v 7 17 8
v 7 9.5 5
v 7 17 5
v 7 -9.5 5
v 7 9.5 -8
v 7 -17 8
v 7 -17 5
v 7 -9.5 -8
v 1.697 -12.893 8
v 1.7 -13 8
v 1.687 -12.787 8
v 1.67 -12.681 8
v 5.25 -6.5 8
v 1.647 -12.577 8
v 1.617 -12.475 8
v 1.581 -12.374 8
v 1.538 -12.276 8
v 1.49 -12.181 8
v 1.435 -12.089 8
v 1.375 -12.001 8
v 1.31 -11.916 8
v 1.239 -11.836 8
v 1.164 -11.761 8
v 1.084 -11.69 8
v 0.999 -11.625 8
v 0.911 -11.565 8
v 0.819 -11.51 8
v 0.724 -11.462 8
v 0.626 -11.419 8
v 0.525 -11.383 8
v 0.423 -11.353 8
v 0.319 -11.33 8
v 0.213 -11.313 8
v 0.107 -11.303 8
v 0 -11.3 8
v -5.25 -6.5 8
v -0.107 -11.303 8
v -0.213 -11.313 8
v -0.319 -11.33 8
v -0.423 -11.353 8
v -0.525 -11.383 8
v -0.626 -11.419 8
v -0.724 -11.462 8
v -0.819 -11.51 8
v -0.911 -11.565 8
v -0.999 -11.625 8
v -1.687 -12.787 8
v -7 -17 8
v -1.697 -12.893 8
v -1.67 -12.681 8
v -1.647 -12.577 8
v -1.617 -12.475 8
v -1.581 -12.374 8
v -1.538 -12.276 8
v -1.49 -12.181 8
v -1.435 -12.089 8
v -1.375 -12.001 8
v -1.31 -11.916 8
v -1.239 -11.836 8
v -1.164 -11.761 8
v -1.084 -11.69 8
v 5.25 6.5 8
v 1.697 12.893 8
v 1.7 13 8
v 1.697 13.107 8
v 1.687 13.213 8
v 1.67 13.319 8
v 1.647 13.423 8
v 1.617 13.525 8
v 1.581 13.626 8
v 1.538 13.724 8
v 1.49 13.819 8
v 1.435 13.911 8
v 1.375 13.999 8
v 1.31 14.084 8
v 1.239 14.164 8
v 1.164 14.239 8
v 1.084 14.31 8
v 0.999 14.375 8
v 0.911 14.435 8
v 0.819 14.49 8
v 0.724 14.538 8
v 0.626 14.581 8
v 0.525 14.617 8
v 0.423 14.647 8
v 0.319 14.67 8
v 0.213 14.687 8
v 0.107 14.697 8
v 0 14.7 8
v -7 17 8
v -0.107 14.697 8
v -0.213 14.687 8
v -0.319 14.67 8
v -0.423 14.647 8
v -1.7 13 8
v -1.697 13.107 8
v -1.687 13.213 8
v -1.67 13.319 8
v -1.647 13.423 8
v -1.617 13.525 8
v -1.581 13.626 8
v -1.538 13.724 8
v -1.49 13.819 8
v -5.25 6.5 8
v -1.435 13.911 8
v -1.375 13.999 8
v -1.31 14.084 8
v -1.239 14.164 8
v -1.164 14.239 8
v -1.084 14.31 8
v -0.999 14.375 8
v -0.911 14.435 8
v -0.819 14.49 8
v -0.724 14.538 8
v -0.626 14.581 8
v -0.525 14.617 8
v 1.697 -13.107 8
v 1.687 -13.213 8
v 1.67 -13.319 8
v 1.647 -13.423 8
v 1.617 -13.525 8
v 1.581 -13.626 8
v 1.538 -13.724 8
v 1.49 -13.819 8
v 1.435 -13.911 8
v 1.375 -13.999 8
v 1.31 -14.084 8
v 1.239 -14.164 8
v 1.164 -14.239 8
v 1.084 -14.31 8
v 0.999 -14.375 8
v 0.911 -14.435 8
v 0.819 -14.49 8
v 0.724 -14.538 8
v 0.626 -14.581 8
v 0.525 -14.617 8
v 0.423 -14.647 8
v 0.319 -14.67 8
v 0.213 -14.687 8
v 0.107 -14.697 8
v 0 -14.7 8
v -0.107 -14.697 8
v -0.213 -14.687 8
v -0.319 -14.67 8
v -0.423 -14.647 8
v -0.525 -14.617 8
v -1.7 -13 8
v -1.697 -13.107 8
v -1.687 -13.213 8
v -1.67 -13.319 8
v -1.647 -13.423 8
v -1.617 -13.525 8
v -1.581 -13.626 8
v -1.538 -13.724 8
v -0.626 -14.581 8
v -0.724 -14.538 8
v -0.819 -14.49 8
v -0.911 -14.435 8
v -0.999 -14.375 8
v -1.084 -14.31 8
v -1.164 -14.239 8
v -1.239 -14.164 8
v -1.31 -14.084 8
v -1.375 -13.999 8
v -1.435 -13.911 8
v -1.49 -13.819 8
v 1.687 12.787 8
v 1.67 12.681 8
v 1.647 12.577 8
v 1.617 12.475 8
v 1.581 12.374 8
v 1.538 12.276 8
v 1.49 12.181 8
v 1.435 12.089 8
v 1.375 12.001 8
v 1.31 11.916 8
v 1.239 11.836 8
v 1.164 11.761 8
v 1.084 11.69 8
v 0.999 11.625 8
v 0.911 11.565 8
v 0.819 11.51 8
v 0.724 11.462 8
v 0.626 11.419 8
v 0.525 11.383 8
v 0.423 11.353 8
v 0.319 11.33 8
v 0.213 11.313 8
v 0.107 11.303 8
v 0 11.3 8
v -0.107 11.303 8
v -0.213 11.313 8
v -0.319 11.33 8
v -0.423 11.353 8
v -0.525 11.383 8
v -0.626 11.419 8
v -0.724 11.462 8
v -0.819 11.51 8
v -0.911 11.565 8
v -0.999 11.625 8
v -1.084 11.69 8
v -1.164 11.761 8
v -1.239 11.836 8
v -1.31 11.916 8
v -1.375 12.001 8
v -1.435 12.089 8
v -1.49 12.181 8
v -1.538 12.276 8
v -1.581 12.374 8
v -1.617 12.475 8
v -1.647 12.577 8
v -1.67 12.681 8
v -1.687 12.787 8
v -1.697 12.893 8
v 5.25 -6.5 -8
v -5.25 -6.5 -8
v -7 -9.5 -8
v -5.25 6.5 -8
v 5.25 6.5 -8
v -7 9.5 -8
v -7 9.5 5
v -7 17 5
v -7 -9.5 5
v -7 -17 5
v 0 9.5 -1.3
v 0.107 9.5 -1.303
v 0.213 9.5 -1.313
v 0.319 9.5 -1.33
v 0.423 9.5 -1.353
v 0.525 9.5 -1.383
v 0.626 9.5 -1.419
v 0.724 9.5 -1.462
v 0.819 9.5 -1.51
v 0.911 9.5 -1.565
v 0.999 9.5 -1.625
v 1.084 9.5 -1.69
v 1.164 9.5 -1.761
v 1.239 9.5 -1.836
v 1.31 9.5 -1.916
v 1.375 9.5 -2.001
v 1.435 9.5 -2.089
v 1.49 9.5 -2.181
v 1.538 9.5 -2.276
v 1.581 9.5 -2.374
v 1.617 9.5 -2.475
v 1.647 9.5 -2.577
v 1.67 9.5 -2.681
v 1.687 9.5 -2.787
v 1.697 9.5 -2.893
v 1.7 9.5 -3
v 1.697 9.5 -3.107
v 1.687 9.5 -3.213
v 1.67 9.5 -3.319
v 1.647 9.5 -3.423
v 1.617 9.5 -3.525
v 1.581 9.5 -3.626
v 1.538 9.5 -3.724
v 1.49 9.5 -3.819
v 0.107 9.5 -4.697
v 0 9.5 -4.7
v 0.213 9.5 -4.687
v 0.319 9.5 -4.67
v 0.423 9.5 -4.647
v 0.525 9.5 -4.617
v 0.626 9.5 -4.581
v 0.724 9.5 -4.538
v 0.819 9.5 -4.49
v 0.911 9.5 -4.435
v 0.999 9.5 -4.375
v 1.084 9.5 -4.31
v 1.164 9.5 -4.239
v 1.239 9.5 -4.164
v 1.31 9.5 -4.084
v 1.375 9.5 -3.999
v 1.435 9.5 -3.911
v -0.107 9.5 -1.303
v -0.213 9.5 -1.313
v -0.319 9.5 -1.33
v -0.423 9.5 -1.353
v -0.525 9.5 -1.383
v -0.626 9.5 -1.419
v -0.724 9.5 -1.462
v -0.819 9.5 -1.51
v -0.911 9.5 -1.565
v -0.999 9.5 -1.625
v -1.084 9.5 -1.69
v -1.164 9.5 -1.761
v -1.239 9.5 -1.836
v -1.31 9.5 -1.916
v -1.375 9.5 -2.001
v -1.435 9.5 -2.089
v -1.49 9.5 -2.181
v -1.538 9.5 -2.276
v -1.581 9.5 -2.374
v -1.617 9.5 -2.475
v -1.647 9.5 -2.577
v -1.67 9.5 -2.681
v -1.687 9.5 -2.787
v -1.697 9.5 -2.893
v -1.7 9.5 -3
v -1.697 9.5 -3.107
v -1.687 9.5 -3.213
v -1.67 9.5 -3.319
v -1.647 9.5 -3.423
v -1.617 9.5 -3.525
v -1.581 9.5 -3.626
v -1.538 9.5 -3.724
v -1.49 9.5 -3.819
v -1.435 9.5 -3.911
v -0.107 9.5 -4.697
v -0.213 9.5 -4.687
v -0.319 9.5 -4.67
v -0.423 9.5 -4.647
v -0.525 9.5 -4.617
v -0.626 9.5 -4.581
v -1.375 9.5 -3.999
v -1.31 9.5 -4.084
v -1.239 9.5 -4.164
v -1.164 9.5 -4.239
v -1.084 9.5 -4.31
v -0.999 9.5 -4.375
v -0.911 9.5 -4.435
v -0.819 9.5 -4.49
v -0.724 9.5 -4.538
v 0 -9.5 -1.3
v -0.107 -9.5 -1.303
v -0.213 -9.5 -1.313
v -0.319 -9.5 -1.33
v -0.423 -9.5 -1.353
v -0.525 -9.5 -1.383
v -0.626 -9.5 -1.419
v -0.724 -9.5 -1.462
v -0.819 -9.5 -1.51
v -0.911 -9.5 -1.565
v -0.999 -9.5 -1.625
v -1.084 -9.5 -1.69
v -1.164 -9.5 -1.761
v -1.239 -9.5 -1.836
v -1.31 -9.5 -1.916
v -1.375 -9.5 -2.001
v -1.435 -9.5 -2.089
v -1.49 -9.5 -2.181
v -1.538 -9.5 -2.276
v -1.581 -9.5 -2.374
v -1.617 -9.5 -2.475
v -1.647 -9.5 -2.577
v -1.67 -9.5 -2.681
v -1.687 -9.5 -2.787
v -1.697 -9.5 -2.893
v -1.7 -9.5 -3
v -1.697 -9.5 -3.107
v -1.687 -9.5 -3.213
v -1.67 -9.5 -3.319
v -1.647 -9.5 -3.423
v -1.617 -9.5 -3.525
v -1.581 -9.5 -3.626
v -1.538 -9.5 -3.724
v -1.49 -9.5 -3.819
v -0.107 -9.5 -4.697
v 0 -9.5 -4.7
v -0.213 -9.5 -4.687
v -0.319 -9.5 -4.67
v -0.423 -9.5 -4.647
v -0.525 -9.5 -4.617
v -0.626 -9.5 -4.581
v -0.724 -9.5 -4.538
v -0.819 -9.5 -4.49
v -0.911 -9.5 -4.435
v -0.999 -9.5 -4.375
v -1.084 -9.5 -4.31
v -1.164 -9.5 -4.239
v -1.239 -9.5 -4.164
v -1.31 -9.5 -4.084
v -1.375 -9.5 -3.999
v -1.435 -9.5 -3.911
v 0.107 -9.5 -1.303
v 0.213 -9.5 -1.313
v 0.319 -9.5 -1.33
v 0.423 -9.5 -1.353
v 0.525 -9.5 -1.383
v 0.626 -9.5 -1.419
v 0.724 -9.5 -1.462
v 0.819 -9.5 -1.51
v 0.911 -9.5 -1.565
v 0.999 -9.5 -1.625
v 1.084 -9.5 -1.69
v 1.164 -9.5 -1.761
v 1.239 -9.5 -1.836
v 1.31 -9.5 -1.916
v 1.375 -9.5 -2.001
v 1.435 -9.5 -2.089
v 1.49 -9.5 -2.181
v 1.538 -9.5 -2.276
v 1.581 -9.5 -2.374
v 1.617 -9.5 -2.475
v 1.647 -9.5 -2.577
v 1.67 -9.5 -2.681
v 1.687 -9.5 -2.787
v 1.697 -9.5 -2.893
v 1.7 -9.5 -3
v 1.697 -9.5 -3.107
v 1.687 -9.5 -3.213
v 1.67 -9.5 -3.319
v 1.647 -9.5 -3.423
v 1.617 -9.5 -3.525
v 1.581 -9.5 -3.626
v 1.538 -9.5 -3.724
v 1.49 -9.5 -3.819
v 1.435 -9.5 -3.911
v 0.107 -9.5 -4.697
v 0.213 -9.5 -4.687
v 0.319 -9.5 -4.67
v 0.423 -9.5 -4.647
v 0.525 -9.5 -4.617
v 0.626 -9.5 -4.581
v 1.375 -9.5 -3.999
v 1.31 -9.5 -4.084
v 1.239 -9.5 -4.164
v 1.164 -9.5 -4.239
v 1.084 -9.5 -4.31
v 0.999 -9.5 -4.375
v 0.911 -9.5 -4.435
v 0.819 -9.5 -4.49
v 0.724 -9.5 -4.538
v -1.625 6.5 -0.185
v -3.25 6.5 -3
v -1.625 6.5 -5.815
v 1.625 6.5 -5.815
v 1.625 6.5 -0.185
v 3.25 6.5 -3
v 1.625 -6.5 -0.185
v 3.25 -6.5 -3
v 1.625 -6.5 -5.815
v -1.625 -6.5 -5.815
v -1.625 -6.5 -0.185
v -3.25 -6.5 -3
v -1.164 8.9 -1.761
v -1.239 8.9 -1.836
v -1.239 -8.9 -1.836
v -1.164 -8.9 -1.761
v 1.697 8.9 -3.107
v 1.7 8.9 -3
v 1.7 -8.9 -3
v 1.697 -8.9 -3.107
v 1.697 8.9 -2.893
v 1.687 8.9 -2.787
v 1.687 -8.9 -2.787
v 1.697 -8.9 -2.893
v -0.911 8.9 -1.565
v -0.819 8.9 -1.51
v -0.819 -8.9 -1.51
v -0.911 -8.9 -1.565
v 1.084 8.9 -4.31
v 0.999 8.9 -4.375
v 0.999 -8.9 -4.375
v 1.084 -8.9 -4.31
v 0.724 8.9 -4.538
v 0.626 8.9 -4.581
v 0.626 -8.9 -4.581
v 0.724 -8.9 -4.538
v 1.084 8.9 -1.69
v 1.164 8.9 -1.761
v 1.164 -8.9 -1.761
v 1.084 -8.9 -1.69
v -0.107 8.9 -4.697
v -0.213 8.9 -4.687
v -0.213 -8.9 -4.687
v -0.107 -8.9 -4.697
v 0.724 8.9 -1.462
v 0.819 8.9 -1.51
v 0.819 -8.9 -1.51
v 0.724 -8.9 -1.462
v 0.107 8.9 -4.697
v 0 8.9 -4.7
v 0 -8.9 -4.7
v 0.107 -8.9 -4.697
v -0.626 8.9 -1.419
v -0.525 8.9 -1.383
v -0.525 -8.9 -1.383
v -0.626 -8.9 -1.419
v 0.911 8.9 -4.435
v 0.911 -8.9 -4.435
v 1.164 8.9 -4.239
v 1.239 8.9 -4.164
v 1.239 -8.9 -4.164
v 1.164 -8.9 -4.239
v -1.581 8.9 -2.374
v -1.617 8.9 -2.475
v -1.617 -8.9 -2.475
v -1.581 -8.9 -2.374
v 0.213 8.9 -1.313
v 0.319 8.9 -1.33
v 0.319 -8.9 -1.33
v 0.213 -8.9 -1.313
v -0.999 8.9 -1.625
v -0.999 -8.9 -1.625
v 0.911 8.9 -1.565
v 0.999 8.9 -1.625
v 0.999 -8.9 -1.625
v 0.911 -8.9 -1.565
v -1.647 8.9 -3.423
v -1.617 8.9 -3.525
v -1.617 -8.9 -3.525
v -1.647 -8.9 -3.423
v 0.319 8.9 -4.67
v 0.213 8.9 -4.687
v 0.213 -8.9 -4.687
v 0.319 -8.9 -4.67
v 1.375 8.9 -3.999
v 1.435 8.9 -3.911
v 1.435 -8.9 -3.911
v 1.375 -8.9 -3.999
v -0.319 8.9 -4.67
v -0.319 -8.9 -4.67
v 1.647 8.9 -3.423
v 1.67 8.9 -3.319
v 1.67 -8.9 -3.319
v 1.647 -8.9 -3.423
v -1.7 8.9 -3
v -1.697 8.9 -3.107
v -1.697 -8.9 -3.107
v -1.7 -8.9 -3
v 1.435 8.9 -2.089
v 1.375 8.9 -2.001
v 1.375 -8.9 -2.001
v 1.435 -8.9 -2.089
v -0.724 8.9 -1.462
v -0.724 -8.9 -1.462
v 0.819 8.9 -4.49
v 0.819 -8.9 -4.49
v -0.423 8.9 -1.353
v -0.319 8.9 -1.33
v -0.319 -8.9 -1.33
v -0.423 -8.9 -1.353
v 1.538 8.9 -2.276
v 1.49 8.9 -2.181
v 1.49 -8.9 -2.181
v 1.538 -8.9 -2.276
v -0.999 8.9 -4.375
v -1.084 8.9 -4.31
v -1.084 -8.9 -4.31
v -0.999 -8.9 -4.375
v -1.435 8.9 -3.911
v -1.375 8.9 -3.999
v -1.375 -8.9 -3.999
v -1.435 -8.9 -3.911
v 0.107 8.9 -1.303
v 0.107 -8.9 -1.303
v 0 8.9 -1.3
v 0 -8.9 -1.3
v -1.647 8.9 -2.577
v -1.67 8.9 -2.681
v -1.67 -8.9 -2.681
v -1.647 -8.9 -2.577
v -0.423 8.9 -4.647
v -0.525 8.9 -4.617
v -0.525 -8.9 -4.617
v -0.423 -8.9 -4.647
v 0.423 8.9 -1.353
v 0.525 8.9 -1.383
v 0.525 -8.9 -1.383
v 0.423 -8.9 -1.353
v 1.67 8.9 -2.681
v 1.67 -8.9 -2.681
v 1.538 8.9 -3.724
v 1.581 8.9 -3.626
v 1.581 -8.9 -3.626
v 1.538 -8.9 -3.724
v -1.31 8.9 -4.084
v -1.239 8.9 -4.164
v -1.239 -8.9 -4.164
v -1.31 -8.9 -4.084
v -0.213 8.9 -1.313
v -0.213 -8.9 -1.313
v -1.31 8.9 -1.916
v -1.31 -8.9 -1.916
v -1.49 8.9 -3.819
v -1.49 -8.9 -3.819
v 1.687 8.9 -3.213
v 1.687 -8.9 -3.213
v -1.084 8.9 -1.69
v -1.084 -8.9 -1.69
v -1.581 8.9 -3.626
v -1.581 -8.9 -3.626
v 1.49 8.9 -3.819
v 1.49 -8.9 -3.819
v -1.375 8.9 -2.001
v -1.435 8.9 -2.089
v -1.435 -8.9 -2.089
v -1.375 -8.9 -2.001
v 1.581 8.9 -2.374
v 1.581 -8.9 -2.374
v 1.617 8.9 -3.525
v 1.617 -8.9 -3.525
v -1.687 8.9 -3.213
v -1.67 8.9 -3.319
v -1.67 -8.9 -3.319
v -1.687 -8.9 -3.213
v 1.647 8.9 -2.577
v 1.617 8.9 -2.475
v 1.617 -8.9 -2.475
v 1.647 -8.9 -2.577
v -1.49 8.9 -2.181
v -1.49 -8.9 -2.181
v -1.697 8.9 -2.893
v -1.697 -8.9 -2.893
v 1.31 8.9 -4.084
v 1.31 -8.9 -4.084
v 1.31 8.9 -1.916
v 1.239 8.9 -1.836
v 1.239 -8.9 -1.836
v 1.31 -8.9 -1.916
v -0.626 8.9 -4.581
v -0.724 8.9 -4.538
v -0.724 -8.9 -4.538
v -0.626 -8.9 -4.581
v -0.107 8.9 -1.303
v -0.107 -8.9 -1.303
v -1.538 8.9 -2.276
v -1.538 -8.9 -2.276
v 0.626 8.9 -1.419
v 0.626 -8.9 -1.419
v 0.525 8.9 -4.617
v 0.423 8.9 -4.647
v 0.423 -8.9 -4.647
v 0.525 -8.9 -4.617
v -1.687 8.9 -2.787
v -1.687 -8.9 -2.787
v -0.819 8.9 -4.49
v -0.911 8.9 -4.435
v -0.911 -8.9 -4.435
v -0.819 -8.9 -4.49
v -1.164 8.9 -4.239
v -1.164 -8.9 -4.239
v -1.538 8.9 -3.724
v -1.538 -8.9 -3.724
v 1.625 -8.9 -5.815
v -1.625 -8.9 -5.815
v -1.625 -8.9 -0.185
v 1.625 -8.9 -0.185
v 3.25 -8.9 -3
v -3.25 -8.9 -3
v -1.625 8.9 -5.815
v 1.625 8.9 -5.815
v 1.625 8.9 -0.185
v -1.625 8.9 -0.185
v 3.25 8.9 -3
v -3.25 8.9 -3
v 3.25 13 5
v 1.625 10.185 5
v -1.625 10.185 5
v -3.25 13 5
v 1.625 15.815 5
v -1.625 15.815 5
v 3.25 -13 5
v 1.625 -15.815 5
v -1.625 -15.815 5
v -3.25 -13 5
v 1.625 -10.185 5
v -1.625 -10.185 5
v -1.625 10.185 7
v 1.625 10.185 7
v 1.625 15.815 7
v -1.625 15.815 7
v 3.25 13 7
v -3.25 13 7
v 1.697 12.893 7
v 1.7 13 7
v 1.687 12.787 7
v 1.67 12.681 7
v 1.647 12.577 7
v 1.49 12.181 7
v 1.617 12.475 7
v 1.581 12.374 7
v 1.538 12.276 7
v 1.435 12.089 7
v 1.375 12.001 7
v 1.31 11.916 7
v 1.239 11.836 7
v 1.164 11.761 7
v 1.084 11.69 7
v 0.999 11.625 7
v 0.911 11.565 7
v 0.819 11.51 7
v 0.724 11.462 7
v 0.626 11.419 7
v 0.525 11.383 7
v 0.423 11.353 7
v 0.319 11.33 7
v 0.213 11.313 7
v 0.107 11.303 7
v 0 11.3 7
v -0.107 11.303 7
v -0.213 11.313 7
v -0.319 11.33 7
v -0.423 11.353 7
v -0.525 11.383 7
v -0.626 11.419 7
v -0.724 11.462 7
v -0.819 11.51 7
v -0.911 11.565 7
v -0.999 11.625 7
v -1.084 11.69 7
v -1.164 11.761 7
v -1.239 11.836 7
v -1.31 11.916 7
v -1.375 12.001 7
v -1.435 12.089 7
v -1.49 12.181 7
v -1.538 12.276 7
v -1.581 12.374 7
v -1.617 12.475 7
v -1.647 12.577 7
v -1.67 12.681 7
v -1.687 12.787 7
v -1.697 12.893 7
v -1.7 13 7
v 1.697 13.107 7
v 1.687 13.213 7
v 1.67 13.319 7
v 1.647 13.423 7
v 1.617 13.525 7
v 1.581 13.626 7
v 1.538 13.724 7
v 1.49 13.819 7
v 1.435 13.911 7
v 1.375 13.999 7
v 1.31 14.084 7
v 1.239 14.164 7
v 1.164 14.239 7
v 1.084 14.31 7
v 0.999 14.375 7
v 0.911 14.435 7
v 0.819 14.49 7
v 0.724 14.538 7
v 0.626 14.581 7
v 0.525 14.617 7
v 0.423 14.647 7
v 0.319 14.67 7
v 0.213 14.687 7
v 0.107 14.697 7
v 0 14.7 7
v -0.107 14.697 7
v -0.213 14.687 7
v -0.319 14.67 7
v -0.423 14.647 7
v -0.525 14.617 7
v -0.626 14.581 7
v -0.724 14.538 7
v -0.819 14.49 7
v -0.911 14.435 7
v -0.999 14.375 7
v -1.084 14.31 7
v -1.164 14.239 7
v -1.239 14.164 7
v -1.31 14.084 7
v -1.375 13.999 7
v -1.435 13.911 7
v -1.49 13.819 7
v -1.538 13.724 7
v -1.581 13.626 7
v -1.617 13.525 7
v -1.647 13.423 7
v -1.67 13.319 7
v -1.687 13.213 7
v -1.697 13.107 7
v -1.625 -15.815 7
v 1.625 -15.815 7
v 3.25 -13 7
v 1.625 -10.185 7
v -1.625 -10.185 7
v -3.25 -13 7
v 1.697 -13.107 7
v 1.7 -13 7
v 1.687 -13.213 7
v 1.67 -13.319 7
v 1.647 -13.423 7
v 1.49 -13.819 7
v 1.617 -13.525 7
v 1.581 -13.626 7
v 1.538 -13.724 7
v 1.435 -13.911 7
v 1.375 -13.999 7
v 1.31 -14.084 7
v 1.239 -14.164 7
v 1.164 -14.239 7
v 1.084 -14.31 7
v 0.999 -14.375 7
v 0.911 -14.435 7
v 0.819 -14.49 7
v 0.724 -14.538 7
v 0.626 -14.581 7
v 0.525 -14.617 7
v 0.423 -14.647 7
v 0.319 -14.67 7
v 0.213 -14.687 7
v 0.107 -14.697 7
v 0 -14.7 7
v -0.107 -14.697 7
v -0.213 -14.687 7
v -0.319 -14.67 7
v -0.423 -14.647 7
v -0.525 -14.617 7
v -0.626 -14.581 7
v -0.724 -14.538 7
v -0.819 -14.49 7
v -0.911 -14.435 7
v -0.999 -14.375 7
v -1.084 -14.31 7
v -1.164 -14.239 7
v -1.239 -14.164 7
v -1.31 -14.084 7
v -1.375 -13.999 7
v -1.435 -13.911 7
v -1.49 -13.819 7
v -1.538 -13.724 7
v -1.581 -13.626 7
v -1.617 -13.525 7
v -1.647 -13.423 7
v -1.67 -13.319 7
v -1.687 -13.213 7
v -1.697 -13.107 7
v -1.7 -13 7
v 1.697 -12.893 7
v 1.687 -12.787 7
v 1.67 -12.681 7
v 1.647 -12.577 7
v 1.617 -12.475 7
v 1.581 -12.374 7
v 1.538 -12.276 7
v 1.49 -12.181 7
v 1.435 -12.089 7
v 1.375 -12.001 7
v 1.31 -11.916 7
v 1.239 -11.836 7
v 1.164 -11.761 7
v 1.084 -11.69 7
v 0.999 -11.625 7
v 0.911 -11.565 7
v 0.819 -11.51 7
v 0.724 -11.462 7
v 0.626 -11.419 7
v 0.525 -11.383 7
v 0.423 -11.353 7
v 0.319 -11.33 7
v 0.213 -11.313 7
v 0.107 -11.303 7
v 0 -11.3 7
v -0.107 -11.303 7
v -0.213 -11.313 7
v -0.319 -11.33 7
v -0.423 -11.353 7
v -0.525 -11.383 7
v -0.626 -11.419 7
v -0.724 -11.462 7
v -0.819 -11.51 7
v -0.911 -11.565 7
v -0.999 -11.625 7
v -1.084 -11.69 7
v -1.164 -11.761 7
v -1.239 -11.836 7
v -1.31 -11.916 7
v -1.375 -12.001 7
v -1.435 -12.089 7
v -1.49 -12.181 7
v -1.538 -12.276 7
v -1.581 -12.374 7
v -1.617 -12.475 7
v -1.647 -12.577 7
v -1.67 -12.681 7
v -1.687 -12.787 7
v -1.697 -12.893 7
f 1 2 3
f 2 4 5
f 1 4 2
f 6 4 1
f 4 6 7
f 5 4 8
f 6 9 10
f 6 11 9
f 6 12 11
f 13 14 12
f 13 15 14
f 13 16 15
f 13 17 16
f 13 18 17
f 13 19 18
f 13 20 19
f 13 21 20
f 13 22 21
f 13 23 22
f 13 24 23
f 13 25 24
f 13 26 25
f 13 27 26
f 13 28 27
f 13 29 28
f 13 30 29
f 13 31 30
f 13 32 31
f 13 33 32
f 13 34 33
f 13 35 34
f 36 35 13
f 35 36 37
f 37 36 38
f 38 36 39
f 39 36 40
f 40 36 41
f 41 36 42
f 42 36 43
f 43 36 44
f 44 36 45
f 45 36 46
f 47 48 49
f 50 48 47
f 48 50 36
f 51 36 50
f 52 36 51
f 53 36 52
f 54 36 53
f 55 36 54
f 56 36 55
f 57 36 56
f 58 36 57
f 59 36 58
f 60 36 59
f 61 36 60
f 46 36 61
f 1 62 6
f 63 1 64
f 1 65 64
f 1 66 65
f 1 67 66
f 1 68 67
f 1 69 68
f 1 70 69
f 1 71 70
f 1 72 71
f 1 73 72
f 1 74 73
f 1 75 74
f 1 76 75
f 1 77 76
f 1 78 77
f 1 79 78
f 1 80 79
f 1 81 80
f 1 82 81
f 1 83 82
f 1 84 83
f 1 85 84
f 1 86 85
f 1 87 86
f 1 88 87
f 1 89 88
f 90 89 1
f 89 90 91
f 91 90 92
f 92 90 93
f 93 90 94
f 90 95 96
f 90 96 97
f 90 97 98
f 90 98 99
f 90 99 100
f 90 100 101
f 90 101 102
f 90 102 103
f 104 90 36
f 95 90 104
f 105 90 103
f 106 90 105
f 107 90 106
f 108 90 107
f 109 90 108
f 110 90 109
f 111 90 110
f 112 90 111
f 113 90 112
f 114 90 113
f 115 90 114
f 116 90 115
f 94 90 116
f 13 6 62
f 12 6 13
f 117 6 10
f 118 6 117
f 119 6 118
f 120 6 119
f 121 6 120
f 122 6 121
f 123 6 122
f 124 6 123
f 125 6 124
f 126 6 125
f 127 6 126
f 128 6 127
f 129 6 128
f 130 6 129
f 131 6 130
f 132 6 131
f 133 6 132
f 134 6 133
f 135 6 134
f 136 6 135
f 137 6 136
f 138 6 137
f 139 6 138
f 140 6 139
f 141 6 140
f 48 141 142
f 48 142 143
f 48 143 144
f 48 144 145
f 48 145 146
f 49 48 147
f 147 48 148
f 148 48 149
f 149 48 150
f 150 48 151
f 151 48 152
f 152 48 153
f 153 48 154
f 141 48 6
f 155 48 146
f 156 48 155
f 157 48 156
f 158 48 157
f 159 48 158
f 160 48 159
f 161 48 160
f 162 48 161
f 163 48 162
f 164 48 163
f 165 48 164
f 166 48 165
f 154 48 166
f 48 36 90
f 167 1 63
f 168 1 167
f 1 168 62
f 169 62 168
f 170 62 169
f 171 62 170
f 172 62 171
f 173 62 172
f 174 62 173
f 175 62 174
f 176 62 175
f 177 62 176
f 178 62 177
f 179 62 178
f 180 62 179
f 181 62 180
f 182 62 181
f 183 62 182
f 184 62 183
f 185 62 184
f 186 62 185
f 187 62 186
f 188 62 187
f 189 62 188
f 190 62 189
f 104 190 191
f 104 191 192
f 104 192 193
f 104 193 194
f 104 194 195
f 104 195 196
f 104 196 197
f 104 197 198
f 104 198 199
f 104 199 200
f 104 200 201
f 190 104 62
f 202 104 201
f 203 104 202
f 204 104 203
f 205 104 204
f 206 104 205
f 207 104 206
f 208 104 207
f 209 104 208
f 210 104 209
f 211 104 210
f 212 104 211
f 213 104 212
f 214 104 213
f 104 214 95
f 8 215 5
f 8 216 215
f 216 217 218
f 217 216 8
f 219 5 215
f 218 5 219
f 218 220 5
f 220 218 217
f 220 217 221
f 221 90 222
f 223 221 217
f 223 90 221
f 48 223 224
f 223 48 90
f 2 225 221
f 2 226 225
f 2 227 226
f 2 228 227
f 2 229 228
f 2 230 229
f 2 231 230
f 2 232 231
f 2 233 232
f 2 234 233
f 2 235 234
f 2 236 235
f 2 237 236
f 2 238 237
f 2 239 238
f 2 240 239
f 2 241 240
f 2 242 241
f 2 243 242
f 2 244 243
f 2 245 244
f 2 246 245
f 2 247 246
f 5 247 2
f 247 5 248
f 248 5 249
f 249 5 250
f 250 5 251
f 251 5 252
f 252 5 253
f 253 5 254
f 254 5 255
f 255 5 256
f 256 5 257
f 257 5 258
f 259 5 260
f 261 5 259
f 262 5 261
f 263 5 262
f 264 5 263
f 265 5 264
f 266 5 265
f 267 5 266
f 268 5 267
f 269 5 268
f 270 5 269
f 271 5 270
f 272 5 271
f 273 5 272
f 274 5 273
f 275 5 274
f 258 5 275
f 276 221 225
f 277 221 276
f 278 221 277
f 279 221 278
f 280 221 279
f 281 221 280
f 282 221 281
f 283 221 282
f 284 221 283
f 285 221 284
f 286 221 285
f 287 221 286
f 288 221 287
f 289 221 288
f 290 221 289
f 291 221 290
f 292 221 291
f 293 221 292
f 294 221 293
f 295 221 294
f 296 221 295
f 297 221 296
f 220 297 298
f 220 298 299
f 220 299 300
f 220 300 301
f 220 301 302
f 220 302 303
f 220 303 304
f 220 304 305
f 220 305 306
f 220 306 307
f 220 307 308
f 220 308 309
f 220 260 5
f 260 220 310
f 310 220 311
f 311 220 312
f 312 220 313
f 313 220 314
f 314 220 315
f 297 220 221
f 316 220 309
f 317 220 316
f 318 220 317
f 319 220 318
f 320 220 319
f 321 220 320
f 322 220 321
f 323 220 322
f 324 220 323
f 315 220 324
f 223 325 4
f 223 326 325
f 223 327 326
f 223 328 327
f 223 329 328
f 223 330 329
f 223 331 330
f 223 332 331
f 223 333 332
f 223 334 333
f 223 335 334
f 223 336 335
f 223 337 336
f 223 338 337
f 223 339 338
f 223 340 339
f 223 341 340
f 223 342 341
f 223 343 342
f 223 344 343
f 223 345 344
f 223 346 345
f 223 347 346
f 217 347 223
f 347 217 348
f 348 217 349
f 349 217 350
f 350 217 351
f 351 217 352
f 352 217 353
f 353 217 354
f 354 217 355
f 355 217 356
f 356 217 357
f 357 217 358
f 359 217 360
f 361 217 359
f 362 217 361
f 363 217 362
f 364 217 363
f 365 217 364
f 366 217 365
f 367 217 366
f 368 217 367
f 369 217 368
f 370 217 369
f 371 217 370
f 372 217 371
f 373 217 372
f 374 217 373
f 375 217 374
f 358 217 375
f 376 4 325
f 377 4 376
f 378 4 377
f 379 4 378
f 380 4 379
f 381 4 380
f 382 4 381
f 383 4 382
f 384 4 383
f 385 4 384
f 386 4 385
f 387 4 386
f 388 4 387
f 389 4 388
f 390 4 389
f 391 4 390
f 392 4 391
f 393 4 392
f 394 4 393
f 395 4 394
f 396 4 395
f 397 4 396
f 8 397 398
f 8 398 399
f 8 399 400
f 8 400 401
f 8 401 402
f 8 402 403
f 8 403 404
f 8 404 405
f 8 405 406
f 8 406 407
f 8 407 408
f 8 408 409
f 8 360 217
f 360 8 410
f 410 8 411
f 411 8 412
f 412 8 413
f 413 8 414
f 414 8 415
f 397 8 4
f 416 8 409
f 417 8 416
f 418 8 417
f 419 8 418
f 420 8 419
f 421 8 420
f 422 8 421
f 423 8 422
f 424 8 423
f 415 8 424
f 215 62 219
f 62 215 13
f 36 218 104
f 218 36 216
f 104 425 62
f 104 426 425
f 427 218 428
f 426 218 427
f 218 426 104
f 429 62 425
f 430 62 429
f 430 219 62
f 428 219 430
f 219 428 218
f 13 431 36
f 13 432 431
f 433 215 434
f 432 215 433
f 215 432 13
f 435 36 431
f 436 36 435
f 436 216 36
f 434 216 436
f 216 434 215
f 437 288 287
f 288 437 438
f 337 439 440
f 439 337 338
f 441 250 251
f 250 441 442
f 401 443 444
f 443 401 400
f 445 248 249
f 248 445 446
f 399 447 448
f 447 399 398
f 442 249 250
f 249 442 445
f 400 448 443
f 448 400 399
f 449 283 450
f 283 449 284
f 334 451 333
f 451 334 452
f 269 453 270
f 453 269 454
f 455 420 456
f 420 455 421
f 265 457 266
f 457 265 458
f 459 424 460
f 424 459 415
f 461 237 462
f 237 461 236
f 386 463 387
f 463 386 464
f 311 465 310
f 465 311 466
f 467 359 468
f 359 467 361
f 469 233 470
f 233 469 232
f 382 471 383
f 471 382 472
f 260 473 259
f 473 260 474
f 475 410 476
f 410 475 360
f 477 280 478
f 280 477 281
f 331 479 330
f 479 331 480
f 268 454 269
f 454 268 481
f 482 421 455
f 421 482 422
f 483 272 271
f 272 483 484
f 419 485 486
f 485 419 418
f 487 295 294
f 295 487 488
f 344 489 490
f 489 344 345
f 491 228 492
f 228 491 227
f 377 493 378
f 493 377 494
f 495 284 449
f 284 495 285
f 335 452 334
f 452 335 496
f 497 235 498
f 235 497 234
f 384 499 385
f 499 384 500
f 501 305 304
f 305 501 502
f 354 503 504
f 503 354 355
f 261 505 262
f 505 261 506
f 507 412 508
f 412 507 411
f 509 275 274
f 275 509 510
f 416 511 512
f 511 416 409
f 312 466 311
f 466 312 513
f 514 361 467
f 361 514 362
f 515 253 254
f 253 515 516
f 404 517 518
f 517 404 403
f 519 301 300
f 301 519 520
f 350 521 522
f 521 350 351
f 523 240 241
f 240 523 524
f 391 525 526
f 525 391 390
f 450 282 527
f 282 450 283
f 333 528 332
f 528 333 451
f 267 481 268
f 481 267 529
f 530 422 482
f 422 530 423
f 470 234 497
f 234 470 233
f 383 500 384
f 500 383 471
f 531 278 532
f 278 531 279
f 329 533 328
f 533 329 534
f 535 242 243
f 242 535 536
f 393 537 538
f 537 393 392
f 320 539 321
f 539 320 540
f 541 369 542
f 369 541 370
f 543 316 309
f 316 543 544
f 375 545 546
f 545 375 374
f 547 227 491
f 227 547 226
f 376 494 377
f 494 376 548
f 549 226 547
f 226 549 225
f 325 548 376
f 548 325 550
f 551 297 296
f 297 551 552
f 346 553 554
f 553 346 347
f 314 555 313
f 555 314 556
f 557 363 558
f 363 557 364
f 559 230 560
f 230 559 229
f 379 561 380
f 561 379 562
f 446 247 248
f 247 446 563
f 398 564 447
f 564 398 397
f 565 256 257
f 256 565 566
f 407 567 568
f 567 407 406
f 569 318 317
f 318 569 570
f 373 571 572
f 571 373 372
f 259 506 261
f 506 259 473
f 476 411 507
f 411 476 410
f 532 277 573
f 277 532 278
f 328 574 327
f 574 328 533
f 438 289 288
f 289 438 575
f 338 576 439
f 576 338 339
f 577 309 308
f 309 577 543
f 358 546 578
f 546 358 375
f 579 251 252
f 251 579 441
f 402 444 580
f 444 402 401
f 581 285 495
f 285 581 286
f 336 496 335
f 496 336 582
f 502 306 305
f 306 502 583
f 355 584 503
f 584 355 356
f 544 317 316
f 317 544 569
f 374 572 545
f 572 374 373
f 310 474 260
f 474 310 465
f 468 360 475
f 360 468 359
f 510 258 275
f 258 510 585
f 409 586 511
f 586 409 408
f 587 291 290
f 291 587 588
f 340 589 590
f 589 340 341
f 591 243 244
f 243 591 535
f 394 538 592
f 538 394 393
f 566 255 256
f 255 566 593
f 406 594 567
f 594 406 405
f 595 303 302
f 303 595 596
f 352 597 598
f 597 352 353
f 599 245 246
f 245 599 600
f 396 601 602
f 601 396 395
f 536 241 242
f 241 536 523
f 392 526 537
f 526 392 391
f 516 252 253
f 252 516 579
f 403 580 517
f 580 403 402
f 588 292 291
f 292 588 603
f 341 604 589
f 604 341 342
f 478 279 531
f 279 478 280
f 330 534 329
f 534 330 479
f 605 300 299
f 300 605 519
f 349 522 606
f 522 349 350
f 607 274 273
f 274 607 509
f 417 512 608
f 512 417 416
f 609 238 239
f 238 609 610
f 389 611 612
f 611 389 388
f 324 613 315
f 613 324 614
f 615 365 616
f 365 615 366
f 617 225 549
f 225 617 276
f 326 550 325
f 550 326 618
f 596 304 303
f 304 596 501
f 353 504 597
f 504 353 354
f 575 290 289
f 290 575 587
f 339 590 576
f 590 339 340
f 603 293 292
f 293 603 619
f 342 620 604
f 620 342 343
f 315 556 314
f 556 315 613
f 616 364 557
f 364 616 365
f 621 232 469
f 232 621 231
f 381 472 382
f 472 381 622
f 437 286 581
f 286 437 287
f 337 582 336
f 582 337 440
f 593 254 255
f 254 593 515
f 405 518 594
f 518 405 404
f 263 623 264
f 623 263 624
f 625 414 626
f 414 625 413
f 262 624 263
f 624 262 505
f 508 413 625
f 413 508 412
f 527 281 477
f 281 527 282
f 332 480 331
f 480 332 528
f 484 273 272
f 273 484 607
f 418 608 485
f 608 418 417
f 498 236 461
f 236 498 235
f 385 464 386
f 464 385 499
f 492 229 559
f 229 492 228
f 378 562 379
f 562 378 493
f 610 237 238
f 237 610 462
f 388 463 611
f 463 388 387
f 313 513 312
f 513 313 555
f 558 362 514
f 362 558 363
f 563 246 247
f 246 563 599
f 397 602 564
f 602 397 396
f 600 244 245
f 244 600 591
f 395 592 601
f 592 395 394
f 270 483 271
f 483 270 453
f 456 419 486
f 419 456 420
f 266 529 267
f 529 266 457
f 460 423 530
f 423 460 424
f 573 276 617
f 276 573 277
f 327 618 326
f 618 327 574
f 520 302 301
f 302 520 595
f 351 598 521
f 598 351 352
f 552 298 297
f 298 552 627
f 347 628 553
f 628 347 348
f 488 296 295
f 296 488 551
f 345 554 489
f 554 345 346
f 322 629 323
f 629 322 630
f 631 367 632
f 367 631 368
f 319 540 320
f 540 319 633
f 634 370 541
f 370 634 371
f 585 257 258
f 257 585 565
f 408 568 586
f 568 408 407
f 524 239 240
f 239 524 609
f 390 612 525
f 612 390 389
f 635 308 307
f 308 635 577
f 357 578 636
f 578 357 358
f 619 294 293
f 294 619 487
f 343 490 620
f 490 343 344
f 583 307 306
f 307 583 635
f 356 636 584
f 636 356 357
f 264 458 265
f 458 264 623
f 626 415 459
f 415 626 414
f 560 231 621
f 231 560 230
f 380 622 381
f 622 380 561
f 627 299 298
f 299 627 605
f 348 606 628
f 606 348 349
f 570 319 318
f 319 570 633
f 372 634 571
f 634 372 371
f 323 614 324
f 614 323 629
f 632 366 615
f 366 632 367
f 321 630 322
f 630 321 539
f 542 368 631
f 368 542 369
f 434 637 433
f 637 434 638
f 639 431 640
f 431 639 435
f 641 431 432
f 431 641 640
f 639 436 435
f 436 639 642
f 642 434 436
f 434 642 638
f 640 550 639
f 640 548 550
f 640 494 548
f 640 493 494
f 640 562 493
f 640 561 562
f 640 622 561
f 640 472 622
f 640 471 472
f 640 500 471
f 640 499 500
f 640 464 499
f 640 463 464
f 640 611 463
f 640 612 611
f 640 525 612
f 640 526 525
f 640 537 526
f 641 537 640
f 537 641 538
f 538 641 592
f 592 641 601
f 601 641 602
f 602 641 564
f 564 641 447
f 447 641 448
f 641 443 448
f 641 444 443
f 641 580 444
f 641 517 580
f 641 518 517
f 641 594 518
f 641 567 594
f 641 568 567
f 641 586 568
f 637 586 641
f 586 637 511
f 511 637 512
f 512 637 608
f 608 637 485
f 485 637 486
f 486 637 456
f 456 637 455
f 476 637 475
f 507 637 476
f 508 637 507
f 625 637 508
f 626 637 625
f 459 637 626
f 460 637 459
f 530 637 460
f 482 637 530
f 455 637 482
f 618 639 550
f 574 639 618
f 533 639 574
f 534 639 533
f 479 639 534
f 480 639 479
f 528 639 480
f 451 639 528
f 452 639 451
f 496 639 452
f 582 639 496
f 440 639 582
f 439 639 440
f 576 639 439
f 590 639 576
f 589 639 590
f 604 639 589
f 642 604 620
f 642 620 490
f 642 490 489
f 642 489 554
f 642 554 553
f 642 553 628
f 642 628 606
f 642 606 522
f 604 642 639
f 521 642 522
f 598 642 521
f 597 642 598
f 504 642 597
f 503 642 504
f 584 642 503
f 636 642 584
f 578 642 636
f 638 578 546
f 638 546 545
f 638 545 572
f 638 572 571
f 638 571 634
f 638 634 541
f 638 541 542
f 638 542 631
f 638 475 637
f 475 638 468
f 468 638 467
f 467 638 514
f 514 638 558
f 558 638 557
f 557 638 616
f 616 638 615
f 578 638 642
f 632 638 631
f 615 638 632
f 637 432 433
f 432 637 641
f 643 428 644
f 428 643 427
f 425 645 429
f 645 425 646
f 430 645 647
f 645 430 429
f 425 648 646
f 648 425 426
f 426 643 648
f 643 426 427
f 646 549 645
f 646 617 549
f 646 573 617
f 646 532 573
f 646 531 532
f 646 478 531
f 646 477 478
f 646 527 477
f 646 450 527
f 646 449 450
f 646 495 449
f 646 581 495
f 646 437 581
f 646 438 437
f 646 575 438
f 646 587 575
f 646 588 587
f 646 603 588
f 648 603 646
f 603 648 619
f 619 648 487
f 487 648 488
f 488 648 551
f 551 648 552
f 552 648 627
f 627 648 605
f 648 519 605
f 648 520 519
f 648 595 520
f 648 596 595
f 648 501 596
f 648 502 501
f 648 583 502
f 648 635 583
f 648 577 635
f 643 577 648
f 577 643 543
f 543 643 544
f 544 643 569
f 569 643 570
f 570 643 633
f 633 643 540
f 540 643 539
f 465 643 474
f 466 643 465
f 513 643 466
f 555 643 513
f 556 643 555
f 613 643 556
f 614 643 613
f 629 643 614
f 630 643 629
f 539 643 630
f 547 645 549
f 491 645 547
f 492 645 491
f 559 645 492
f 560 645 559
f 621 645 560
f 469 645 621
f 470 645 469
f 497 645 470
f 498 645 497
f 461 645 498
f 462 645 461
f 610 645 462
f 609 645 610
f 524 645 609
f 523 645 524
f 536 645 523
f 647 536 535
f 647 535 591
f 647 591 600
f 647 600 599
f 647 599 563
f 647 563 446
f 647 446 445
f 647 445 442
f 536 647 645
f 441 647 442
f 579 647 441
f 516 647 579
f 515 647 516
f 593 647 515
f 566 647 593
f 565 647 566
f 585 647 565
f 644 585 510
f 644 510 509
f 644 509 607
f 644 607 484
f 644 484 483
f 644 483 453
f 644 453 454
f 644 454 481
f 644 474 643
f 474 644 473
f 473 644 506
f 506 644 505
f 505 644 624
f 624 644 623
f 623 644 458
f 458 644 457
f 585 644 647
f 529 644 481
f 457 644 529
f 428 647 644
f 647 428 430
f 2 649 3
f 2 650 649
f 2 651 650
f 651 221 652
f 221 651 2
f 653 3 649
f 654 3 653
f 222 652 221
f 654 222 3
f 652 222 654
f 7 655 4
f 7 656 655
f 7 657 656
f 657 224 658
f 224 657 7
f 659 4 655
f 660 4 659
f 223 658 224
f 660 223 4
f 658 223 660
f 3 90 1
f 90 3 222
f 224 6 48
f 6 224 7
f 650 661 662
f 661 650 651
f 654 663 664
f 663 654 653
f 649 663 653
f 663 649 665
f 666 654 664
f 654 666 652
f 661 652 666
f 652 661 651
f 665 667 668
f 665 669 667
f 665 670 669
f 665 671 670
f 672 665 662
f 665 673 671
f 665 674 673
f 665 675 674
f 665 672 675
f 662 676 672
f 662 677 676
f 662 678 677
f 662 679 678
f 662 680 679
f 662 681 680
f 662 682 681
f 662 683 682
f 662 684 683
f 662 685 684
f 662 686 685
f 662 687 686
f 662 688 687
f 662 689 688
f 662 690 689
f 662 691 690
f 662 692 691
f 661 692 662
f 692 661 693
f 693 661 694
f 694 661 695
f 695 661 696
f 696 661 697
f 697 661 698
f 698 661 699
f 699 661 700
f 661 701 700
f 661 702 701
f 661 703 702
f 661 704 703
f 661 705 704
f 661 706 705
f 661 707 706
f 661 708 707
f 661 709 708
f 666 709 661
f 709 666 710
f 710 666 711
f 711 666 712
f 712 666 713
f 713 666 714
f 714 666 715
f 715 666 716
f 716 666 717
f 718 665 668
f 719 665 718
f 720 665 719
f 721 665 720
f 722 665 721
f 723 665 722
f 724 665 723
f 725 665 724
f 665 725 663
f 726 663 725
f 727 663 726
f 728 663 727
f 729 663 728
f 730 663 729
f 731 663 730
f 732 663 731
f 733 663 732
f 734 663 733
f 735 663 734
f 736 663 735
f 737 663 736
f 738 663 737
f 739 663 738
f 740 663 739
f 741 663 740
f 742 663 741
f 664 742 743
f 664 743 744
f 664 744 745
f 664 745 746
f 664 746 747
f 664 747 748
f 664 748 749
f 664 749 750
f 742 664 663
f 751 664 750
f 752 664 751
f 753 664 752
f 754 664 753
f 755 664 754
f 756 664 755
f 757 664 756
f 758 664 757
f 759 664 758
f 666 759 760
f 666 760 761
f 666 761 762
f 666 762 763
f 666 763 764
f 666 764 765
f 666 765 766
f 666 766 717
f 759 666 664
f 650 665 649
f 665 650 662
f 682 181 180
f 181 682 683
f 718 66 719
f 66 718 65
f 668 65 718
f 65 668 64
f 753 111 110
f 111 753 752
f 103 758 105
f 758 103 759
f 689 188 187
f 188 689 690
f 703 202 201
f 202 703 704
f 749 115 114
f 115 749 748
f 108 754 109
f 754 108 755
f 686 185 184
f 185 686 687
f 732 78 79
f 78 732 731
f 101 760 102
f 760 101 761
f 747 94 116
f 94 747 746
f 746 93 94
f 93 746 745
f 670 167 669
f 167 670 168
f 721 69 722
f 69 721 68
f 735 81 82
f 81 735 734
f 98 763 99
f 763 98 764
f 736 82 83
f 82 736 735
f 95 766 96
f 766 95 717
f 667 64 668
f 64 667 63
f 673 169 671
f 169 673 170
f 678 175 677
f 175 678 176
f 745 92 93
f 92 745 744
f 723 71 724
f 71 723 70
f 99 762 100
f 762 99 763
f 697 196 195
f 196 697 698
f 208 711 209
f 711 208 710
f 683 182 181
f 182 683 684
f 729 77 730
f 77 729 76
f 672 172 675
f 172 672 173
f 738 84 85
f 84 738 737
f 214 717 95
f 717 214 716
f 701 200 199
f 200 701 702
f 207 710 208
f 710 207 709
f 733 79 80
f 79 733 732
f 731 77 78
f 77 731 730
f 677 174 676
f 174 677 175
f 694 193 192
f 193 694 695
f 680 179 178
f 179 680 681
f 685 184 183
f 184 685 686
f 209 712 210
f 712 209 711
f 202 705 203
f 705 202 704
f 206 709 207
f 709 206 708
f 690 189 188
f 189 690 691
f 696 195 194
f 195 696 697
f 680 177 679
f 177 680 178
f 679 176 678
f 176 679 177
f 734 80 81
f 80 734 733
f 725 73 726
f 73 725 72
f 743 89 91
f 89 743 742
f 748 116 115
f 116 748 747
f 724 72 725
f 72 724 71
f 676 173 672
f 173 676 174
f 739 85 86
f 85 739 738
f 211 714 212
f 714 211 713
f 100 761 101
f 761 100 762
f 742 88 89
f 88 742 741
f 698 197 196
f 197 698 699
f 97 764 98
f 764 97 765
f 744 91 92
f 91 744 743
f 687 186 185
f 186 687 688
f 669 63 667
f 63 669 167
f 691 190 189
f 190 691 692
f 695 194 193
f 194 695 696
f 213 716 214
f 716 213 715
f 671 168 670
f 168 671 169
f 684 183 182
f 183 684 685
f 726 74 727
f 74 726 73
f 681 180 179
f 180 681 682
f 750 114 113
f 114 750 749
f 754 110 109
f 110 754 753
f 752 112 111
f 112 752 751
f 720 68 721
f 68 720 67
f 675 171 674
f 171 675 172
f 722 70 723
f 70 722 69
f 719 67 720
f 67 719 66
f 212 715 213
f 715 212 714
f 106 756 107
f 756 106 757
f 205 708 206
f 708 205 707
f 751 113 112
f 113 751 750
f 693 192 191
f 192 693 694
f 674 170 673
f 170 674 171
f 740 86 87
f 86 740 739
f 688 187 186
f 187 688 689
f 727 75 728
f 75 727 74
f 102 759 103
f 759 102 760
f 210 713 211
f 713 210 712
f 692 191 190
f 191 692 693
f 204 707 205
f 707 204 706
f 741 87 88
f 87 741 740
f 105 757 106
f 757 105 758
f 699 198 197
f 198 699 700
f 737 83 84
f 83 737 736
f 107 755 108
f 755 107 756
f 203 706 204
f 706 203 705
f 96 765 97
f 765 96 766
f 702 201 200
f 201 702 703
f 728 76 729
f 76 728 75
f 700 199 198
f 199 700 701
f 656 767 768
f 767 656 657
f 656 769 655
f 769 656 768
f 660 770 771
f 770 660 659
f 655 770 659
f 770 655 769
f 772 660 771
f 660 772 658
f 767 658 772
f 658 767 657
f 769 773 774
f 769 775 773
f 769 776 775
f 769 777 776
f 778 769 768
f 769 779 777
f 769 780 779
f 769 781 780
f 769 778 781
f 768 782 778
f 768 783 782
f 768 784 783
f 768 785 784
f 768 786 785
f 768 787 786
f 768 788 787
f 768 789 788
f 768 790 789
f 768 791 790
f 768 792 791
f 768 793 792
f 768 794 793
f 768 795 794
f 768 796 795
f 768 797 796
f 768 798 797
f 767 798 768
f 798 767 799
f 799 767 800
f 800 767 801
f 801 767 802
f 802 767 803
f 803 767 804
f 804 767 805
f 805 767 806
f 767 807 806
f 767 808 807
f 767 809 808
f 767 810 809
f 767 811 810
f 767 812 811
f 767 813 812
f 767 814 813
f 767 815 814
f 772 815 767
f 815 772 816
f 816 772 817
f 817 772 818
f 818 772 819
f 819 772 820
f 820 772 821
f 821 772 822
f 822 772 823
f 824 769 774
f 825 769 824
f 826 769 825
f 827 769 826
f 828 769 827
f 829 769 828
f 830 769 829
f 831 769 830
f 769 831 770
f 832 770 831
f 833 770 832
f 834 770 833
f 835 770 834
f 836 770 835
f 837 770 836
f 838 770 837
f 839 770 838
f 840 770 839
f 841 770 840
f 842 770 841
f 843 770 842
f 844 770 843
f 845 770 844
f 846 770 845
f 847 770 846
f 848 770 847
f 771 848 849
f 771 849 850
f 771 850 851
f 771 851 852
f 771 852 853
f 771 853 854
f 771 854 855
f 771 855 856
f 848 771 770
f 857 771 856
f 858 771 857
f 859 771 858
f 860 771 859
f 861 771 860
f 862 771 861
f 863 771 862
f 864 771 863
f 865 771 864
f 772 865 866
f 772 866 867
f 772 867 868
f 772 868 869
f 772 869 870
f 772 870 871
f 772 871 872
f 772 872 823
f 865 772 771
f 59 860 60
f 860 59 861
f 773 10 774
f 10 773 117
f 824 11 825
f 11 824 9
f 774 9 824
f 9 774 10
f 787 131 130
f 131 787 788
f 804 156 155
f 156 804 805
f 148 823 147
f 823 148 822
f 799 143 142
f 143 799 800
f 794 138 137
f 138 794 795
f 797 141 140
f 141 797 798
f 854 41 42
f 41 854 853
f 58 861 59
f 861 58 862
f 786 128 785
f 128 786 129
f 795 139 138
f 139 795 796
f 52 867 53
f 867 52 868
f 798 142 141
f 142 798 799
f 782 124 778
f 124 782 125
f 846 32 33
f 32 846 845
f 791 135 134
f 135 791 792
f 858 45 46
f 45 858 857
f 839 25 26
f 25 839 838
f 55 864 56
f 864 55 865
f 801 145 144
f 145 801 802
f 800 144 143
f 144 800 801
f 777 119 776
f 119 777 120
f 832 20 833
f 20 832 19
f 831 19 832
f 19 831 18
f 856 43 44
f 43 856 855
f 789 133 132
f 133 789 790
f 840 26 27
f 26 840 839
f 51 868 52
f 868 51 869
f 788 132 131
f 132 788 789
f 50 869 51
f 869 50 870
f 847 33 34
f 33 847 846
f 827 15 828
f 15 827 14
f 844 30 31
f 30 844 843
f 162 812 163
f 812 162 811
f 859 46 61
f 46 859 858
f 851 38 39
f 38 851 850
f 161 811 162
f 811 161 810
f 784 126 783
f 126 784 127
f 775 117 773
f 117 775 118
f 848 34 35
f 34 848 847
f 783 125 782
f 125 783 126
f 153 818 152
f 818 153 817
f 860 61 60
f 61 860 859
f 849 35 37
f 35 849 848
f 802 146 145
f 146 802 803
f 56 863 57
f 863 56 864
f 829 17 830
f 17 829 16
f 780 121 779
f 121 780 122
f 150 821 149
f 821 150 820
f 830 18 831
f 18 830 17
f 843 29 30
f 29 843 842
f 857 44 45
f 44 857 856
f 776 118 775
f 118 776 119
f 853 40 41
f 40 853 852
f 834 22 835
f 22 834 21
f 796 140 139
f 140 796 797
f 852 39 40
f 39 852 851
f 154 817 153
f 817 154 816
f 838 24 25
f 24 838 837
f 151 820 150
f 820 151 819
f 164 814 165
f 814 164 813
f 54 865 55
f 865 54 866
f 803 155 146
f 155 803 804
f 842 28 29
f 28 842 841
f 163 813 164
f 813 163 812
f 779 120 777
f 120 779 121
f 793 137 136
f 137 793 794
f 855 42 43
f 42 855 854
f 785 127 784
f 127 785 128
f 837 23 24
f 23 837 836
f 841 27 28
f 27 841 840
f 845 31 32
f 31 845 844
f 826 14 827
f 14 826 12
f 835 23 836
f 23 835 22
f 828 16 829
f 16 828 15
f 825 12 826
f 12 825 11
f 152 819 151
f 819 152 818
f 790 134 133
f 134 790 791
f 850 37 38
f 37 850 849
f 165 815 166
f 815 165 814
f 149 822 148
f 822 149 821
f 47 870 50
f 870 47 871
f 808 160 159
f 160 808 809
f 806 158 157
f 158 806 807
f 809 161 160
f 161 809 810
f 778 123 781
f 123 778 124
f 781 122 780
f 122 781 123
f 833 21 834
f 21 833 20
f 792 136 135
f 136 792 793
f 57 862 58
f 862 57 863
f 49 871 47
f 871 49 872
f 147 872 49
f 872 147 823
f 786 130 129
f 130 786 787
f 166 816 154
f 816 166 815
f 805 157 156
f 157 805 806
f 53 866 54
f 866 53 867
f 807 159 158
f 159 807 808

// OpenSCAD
//pololu
//cube([10,12,23],true);

//LONG = 23-7 = 16 14

//cover
//cube([12,14,14],true);
diam_tuerca = 6.5;
diam_tornillo = 3.4;


difference(){
 cube([14,19,16],true);   
    cube([10.5,13,23],true);
    translate([0,20,-3]) rotate([90,0,0]) cylinder(r=diam_tornillo/2,h=40,$fn=100);
    translate([0,-6.4,-3]) rotate([90,0,0]) cylinder(r=diam_tuerca/2,h=2.5,$fn=6);
    translate([0,8.9,-3]) rotate([90,0,0]) cylinder(r=diam_tuerca/2,h=2.5,$fn=6);
    //translate([0,10,0]) cube([2.7,10,12],true);
    //translate([0,-10,0]) cube([2.7,10,12],true);
}


translate([0,0,6.5])
difference(){
cube([14,34,3],true);
    
    //cube([3,29,5],true);    
    
    translate([0,13,-2]) cylinder(r=diam_tuerca/2,h=2.5,$fn=6);
    translate([0,13,-2]) cylinder(r=diam_tornillo/2,h=50,$fn=100);
    
    
    translate([0,-13,-2]) cylinder(r=diam_tuerca/2,h=2.5,$fn=6);
    translate([0,-13,-2]) cylinder(r=diam_tornillo/2,h=50,$fn=100);
    
    cube([10.5,13,23],true);
    
    
}
